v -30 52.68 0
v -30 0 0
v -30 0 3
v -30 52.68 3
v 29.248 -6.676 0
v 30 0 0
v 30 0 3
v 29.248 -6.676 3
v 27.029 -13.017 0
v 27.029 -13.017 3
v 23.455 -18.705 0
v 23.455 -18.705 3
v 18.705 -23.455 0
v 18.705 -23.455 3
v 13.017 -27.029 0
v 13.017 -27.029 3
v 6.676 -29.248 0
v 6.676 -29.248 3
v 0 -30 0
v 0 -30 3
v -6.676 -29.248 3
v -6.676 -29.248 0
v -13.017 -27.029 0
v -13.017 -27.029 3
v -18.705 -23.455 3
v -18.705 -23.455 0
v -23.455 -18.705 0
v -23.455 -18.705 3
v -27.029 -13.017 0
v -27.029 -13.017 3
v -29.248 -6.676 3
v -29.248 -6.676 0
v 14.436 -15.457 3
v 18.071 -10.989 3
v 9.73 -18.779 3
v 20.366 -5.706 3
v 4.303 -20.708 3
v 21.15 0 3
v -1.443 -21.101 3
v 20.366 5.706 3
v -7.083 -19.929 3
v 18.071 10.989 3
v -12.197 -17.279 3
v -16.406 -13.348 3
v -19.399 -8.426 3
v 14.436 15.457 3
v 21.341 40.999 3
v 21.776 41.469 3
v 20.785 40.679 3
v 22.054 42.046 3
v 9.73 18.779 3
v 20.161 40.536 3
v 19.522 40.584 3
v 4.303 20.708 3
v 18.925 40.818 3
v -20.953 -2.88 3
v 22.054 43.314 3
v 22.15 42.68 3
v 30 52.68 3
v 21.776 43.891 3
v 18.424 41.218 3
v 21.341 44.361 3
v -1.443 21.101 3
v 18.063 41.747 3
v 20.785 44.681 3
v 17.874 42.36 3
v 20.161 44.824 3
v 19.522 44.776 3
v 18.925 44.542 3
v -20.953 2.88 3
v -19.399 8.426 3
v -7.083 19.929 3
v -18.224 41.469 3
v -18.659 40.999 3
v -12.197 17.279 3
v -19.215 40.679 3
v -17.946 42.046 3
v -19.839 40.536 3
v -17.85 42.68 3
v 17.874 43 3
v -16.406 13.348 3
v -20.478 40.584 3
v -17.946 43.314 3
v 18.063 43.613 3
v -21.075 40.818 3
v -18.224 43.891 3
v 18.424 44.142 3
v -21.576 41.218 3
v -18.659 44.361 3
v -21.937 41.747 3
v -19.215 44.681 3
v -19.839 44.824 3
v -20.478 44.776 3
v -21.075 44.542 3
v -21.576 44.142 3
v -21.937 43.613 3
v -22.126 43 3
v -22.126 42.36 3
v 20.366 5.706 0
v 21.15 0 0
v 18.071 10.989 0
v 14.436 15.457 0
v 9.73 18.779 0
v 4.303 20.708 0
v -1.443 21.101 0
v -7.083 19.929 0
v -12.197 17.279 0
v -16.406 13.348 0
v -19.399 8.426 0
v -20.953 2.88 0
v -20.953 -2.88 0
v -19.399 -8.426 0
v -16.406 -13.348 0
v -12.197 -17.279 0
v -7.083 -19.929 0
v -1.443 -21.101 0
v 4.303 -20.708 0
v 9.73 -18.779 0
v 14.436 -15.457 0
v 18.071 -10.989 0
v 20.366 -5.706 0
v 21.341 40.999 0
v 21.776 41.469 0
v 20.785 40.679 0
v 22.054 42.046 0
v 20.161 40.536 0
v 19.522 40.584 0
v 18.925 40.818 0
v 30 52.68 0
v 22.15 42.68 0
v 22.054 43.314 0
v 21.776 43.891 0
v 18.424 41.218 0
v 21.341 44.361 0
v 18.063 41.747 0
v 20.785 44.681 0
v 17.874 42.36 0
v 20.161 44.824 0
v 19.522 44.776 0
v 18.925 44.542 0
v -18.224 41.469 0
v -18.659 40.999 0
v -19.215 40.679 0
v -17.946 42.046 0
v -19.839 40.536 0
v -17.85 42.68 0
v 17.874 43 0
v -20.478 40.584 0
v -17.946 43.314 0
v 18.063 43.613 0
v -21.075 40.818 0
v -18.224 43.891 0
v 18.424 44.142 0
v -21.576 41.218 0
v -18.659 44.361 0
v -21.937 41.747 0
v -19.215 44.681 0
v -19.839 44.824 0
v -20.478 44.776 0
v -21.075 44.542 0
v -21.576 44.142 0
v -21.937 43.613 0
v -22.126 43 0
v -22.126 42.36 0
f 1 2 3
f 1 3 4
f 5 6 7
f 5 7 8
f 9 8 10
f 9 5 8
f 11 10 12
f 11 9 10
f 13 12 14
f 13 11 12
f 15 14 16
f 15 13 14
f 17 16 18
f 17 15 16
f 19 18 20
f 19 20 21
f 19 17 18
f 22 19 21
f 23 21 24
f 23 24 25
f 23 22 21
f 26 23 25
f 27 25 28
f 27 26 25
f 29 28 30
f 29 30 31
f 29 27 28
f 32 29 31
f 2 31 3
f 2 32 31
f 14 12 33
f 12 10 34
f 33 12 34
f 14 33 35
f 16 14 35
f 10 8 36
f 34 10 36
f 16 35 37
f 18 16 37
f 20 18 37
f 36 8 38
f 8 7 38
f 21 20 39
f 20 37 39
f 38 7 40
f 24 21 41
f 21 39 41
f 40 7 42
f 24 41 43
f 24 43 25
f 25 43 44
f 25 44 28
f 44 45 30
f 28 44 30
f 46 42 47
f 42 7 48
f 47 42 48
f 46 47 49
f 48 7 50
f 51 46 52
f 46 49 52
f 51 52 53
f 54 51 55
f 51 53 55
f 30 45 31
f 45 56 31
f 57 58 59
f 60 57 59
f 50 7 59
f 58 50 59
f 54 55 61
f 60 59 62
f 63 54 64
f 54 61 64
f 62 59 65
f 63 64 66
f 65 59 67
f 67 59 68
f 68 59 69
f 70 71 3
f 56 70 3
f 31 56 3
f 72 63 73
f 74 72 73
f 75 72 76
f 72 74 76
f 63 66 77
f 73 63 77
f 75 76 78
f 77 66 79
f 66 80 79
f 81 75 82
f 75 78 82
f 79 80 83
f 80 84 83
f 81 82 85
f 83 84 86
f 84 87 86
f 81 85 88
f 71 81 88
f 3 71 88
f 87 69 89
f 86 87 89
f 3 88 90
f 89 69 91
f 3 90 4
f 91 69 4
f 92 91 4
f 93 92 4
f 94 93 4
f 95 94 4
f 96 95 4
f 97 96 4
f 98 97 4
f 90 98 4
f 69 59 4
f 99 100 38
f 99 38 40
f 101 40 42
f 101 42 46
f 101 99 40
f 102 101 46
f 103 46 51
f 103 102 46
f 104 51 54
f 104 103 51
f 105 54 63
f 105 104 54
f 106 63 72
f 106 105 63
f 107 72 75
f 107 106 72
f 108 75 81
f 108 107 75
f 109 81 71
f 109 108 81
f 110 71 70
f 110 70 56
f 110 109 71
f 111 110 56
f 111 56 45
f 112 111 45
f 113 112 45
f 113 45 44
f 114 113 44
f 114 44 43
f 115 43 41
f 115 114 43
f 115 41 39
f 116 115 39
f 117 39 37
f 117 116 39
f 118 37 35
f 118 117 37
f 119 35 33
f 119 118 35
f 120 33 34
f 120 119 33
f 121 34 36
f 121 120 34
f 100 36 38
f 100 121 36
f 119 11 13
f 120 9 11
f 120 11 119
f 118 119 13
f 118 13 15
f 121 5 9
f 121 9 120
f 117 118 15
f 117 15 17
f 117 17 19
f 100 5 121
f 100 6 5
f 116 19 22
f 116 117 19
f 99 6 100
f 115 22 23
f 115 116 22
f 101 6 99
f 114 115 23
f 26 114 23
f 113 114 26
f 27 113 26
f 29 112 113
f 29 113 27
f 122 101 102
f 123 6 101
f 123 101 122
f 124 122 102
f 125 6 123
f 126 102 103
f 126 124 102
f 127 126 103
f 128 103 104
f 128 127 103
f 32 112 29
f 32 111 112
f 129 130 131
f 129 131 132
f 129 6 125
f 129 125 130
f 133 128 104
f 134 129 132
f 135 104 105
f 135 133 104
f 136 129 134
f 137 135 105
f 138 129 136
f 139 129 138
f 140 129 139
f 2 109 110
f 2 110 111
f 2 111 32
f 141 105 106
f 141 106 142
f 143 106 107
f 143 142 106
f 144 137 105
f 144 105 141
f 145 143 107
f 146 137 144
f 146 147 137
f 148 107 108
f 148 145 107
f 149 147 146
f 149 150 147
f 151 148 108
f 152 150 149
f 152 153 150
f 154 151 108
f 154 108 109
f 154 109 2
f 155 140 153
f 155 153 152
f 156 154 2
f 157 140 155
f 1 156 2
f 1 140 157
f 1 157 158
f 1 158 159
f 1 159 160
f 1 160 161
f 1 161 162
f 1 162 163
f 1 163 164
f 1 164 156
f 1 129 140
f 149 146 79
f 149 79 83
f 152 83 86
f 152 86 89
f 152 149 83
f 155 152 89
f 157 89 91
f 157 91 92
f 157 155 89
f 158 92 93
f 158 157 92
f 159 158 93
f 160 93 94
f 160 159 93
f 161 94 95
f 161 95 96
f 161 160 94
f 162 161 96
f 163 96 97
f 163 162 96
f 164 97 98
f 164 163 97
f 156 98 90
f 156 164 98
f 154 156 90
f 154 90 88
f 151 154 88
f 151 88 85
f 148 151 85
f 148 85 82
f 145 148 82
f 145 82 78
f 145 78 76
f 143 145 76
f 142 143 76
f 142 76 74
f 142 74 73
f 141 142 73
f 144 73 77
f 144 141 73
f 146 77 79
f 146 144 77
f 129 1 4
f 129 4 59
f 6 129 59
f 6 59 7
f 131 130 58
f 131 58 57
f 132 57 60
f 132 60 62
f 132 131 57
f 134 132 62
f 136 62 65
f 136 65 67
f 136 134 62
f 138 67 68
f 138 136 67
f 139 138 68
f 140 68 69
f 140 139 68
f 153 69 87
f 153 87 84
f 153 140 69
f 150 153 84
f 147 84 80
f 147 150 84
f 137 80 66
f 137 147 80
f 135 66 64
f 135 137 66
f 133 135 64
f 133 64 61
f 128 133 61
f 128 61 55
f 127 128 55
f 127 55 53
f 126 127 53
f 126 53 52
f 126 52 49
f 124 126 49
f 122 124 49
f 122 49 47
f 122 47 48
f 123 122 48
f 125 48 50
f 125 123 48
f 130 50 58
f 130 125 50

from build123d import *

# Parameters (mm, degrees)
SKETCH_1_R      = 21.15
SKETCH_1_R_2    = 2.15
EXTRUDE_1_DEPTH = 3


with BuildPart() as part:
    # 草图1 → 凸台-拉伸1 (new body)
    with BuildSketch(Plane.XY):
        with BuildLine():
            Line((-30, 0), (-30, 52.68))
            Line((-30, 52.68), (30, 52.68))
            Line((30, 52.68), (30, 0))
            ThreePointArc((30, 0), (0, -30), (-30, 0))
        make_face()
        Circle(SKETCH_1_R, mode=Mode.SUBTRACT)
        with Locations((-20, 42.68)):
            Circle(SKETCH_1_R_2, mode=Mode.SUBTRACT)
        with Locations((20, 42.68)):
            Circle(SKETCH_1_R_2, mode=Mode.SUBTRACT)
    extrude(amount=EXTRUDE_1_DEPTH)


solid = part.part
